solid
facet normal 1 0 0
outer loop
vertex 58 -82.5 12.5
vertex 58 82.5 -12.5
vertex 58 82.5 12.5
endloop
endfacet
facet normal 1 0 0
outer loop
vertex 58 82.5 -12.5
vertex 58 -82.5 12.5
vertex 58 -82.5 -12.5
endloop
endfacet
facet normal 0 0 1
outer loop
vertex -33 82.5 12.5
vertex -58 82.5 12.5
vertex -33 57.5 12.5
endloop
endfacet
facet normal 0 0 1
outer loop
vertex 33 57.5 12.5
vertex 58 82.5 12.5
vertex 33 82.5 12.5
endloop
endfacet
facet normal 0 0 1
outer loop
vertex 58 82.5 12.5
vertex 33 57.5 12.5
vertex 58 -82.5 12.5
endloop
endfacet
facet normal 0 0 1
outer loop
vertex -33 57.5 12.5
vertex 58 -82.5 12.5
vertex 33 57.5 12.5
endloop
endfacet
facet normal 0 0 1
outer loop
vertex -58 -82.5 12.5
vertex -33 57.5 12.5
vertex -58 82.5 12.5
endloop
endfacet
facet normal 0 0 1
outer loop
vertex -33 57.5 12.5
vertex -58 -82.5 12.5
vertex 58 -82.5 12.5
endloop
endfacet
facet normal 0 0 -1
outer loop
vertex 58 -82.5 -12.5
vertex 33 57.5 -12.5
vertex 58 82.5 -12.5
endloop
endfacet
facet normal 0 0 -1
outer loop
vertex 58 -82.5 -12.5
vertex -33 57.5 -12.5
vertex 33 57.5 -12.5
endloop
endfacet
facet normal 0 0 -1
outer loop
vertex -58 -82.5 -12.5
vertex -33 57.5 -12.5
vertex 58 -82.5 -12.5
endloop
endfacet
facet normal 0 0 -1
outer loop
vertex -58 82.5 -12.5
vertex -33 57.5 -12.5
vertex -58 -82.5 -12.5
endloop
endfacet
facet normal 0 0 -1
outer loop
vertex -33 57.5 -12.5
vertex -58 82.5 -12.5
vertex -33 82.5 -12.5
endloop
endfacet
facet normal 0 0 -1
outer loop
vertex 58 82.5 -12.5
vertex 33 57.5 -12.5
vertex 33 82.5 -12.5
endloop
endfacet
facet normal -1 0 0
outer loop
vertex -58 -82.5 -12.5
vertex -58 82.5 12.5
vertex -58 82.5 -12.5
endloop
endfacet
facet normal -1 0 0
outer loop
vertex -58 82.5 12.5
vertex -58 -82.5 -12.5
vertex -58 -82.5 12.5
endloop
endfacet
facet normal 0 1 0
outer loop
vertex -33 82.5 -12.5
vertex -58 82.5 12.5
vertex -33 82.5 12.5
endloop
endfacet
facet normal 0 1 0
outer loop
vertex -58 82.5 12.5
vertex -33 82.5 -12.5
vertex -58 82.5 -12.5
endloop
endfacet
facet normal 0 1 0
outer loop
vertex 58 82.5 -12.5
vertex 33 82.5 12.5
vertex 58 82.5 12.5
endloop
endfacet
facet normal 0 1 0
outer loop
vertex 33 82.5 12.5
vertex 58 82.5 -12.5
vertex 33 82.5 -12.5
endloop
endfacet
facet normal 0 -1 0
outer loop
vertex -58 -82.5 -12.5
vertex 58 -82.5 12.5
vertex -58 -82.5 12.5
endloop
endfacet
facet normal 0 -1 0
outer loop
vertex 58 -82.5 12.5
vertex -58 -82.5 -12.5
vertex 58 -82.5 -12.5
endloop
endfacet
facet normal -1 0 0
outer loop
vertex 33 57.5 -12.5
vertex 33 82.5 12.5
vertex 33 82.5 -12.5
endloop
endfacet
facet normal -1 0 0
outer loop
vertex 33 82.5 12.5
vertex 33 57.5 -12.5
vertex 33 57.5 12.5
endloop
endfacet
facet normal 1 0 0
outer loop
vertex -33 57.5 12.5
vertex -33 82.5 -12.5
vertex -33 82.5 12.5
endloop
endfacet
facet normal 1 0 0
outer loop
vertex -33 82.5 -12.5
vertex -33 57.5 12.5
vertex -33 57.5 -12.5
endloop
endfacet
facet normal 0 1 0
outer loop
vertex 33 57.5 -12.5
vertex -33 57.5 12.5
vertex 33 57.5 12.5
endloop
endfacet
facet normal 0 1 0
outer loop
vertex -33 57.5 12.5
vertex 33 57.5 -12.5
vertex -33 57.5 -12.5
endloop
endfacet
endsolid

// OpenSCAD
block_h = 25;
leg_w = 66;
leg_d = 25;
side_w = 25;
space_d = 140;
block_d = space_d + leg_d;
difference() {
  cube([leg_w+side_w*2,block_d,block_h],center=true);
  translate([0,block_d/2,0]) cube([leg_w,leg_d*2,block_h+2], center=true);
}
